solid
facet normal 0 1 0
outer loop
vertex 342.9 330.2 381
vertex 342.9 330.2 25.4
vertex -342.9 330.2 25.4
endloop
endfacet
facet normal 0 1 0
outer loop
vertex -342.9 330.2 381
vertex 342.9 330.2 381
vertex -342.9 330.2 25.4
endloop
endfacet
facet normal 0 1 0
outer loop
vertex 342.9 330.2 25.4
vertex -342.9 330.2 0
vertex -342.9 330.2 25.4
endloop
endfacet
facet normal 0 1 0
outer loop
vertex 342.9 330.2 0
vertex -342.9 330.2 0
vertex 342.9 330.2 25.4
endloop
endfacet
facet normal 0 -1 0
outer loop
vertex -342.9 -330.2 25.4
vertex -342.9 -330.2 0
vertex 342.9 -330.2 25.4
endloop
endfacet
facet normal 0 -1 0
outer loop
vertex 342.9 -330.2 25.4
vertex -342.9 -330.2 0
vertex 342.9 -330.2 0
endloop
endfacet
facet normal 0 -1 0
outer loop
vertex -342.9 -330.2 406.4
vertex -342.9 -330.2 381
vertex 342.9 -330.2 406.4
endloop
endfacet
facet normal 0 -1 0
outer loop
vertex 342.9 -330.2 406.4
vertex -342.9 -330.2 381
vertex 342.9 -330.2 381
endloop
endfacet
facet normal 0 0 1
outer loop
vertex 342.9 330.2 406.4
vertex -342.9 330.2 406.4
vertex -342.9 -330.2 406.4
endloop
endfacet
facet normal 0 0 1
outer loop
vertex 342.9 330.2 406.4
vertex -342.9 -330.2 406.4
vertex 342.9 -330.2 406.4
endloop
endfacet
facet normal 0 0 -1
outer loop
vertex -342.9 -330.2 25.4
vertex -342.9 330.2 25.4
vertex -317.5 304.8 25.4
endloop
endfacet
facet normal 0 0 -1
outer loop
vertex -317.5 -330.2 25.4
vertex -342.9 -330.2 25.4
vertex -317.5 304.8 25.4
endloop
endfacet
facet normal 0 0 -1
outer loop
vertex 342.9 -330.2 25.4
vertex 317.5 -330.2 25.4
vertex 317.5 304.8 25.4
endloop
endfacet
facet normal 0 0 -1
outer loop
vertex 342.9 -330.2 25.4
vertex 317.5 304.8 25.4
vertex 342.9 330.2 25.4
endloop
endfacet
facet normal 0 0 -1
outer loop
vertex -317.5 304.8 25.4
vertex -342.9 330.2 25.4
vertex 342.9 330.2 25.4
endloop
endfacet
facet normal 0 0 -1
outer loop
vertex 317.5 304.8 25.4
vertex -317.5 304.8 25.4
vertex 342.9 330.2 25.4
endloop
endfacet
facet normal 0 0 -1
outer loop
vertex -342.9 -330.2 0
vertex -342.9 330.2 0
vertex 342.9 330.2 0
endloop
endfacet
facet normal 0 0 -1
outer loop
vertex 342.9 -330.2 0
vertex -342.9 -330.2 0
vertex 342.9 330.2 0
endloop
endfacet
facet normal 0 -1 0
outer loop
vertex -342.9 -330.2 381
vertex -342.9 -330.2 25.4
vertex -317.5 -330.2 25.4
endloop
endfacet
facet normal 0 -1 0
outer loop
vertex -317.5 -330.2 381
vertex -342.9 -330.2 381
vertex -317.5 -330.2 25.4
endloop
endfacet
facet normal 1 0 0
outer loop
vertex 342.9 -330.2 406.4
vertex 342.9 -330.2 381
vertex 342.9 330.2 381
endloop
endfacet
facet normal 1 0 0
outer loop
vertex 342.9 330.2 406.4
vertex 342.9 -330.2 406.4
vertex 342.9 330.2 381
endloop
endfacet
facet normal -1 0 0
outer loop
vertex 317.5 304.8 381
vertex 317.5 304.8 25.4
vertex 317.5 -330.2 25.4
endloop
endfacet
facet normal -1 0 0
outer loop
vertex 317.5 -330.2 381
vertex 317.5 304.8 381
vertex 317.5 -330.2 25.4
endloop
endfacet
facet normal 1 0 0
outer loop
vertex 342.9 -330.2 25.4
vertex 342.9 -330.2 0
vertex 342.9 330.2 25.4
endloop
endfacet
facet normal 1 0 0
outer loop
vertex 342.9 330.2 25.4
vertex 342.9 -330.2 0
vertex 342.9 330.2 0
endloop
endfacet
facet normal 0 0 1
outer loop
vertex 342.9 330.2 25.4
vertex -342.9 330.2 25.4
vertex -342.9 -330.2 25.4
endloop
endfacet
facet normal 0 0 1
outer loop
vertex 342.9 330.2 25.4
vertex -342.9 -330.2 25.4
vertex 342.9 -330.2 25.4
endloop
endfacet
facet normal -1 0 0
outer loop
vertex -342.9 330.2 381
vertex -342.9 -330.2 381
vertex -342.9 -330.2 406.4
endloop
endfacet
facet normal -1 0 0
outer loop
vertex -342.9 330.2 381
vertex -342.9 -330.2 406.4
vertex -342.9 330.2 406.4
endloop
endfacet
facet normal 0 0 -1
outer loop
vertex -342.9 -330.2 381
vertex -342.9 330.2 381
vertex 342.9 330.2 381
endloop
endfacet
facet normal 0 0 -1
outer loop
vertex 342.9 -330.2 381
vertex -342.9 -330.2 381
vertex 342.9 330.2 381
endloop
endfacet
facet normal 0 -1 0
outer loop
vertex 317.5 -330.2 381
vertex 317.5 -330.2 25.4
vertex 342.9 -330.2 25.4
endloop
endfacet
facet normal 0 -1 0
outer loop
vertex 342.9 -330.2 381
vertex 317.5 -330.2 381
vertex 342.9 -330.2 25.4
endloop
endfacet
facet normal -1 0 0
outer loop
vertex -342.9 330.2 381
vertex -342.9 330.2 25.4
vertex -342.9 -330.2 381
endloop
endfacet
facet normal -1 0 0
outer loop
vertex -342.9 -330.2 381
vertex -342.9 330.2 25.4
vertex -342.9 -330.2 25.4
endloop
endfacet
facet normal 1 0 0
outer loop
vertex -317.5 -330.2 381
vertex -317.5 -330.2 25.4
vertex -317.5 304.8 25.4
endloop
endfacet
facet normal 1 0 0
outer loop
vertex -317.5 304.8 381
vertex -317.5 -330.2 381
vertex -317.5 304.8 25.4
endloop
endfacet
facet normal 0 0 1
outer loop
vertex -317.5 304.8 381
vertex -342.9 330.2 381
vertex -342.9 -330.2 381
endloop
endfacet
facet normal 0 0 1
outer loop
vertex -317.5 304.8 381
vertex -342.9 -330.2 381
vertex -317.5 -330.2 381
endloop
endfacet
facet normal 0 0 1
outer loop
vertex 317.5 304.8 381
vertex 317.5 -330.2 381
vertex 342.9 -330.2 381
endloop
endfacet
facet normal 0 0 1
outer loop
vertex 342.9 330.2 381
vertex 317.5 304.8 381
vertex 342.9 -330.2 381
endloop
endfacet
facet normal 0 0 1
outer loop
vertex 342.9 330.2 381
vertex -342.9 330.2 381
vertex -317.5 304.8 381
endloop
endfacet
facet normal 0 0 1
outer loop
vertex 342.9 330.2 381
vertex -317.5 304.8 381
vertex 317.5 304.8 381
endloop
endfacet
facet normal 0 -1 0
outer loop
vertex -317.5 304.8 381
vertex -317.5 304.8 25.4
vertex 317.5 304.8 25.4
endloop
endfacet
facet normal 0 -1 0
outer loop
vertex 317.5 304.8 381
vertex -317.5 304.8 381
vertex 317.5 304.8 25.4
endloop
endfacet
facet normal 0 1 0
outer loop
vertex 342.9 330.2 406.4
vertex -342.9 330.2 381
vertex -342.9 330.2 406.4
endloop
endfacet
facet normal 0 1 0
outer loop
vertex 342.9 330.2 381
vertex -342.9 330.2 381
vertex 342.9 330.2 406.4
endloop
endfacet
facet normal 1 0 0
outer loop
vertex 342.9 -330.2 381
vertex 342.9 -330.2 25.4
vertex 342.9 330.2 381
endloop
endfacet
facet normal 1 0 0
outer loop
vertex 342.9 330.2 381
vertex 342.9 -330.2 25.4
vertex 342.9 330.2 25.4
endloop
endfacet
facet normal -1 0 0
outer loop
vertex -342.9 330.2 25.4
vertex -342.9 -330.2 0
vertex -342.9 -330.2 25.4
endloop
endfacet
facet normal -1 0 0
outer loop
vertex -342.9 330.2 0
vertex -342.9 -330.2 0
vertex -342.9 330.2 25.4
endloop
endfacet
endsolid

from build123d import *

# Parameters (mm, degrees)
F0_W     = 685.8
F0_H     = 660.4
F1_DEPTH = 25.4
F3_DEPTH = 355.6
F4_W     = 685.8
F4_H     = 660.4
F5_DEPTH = 25.4


with BuildPart() as f1:
    # F0 (on Top) → F1 (new body)
    with BuildSketch(Plane.XY):
        Rectangle(F0_W, F0_H)
    extrude(amount=F1_DEPTH)


with BuildPart() as f3:
    # F2 (on face) → F3 (new body)
    with BuildSketch(Plane.XY.offset(25.4)):
        Polygon((342.9, 330.2), (-342.9, 330.2), (-342.9, -330.2), (-317.5, -330.2), (-317.5, 304.8), (317.5, 304.8), (317.5, -330.2), (342.9, -330.2), align=None)
    extrude(amount=F3_DEPTH)


with BuildPart() as f5:
    # F4 (on face) → F5 (new body)
    with BuildSketch(Plane.XY.offset(381)):
        Rectangle(F4_W, F4_H)
    extrude(amount=F5_DEPTH)


solid = Compound([f1.part, f3.part, f5.part])
